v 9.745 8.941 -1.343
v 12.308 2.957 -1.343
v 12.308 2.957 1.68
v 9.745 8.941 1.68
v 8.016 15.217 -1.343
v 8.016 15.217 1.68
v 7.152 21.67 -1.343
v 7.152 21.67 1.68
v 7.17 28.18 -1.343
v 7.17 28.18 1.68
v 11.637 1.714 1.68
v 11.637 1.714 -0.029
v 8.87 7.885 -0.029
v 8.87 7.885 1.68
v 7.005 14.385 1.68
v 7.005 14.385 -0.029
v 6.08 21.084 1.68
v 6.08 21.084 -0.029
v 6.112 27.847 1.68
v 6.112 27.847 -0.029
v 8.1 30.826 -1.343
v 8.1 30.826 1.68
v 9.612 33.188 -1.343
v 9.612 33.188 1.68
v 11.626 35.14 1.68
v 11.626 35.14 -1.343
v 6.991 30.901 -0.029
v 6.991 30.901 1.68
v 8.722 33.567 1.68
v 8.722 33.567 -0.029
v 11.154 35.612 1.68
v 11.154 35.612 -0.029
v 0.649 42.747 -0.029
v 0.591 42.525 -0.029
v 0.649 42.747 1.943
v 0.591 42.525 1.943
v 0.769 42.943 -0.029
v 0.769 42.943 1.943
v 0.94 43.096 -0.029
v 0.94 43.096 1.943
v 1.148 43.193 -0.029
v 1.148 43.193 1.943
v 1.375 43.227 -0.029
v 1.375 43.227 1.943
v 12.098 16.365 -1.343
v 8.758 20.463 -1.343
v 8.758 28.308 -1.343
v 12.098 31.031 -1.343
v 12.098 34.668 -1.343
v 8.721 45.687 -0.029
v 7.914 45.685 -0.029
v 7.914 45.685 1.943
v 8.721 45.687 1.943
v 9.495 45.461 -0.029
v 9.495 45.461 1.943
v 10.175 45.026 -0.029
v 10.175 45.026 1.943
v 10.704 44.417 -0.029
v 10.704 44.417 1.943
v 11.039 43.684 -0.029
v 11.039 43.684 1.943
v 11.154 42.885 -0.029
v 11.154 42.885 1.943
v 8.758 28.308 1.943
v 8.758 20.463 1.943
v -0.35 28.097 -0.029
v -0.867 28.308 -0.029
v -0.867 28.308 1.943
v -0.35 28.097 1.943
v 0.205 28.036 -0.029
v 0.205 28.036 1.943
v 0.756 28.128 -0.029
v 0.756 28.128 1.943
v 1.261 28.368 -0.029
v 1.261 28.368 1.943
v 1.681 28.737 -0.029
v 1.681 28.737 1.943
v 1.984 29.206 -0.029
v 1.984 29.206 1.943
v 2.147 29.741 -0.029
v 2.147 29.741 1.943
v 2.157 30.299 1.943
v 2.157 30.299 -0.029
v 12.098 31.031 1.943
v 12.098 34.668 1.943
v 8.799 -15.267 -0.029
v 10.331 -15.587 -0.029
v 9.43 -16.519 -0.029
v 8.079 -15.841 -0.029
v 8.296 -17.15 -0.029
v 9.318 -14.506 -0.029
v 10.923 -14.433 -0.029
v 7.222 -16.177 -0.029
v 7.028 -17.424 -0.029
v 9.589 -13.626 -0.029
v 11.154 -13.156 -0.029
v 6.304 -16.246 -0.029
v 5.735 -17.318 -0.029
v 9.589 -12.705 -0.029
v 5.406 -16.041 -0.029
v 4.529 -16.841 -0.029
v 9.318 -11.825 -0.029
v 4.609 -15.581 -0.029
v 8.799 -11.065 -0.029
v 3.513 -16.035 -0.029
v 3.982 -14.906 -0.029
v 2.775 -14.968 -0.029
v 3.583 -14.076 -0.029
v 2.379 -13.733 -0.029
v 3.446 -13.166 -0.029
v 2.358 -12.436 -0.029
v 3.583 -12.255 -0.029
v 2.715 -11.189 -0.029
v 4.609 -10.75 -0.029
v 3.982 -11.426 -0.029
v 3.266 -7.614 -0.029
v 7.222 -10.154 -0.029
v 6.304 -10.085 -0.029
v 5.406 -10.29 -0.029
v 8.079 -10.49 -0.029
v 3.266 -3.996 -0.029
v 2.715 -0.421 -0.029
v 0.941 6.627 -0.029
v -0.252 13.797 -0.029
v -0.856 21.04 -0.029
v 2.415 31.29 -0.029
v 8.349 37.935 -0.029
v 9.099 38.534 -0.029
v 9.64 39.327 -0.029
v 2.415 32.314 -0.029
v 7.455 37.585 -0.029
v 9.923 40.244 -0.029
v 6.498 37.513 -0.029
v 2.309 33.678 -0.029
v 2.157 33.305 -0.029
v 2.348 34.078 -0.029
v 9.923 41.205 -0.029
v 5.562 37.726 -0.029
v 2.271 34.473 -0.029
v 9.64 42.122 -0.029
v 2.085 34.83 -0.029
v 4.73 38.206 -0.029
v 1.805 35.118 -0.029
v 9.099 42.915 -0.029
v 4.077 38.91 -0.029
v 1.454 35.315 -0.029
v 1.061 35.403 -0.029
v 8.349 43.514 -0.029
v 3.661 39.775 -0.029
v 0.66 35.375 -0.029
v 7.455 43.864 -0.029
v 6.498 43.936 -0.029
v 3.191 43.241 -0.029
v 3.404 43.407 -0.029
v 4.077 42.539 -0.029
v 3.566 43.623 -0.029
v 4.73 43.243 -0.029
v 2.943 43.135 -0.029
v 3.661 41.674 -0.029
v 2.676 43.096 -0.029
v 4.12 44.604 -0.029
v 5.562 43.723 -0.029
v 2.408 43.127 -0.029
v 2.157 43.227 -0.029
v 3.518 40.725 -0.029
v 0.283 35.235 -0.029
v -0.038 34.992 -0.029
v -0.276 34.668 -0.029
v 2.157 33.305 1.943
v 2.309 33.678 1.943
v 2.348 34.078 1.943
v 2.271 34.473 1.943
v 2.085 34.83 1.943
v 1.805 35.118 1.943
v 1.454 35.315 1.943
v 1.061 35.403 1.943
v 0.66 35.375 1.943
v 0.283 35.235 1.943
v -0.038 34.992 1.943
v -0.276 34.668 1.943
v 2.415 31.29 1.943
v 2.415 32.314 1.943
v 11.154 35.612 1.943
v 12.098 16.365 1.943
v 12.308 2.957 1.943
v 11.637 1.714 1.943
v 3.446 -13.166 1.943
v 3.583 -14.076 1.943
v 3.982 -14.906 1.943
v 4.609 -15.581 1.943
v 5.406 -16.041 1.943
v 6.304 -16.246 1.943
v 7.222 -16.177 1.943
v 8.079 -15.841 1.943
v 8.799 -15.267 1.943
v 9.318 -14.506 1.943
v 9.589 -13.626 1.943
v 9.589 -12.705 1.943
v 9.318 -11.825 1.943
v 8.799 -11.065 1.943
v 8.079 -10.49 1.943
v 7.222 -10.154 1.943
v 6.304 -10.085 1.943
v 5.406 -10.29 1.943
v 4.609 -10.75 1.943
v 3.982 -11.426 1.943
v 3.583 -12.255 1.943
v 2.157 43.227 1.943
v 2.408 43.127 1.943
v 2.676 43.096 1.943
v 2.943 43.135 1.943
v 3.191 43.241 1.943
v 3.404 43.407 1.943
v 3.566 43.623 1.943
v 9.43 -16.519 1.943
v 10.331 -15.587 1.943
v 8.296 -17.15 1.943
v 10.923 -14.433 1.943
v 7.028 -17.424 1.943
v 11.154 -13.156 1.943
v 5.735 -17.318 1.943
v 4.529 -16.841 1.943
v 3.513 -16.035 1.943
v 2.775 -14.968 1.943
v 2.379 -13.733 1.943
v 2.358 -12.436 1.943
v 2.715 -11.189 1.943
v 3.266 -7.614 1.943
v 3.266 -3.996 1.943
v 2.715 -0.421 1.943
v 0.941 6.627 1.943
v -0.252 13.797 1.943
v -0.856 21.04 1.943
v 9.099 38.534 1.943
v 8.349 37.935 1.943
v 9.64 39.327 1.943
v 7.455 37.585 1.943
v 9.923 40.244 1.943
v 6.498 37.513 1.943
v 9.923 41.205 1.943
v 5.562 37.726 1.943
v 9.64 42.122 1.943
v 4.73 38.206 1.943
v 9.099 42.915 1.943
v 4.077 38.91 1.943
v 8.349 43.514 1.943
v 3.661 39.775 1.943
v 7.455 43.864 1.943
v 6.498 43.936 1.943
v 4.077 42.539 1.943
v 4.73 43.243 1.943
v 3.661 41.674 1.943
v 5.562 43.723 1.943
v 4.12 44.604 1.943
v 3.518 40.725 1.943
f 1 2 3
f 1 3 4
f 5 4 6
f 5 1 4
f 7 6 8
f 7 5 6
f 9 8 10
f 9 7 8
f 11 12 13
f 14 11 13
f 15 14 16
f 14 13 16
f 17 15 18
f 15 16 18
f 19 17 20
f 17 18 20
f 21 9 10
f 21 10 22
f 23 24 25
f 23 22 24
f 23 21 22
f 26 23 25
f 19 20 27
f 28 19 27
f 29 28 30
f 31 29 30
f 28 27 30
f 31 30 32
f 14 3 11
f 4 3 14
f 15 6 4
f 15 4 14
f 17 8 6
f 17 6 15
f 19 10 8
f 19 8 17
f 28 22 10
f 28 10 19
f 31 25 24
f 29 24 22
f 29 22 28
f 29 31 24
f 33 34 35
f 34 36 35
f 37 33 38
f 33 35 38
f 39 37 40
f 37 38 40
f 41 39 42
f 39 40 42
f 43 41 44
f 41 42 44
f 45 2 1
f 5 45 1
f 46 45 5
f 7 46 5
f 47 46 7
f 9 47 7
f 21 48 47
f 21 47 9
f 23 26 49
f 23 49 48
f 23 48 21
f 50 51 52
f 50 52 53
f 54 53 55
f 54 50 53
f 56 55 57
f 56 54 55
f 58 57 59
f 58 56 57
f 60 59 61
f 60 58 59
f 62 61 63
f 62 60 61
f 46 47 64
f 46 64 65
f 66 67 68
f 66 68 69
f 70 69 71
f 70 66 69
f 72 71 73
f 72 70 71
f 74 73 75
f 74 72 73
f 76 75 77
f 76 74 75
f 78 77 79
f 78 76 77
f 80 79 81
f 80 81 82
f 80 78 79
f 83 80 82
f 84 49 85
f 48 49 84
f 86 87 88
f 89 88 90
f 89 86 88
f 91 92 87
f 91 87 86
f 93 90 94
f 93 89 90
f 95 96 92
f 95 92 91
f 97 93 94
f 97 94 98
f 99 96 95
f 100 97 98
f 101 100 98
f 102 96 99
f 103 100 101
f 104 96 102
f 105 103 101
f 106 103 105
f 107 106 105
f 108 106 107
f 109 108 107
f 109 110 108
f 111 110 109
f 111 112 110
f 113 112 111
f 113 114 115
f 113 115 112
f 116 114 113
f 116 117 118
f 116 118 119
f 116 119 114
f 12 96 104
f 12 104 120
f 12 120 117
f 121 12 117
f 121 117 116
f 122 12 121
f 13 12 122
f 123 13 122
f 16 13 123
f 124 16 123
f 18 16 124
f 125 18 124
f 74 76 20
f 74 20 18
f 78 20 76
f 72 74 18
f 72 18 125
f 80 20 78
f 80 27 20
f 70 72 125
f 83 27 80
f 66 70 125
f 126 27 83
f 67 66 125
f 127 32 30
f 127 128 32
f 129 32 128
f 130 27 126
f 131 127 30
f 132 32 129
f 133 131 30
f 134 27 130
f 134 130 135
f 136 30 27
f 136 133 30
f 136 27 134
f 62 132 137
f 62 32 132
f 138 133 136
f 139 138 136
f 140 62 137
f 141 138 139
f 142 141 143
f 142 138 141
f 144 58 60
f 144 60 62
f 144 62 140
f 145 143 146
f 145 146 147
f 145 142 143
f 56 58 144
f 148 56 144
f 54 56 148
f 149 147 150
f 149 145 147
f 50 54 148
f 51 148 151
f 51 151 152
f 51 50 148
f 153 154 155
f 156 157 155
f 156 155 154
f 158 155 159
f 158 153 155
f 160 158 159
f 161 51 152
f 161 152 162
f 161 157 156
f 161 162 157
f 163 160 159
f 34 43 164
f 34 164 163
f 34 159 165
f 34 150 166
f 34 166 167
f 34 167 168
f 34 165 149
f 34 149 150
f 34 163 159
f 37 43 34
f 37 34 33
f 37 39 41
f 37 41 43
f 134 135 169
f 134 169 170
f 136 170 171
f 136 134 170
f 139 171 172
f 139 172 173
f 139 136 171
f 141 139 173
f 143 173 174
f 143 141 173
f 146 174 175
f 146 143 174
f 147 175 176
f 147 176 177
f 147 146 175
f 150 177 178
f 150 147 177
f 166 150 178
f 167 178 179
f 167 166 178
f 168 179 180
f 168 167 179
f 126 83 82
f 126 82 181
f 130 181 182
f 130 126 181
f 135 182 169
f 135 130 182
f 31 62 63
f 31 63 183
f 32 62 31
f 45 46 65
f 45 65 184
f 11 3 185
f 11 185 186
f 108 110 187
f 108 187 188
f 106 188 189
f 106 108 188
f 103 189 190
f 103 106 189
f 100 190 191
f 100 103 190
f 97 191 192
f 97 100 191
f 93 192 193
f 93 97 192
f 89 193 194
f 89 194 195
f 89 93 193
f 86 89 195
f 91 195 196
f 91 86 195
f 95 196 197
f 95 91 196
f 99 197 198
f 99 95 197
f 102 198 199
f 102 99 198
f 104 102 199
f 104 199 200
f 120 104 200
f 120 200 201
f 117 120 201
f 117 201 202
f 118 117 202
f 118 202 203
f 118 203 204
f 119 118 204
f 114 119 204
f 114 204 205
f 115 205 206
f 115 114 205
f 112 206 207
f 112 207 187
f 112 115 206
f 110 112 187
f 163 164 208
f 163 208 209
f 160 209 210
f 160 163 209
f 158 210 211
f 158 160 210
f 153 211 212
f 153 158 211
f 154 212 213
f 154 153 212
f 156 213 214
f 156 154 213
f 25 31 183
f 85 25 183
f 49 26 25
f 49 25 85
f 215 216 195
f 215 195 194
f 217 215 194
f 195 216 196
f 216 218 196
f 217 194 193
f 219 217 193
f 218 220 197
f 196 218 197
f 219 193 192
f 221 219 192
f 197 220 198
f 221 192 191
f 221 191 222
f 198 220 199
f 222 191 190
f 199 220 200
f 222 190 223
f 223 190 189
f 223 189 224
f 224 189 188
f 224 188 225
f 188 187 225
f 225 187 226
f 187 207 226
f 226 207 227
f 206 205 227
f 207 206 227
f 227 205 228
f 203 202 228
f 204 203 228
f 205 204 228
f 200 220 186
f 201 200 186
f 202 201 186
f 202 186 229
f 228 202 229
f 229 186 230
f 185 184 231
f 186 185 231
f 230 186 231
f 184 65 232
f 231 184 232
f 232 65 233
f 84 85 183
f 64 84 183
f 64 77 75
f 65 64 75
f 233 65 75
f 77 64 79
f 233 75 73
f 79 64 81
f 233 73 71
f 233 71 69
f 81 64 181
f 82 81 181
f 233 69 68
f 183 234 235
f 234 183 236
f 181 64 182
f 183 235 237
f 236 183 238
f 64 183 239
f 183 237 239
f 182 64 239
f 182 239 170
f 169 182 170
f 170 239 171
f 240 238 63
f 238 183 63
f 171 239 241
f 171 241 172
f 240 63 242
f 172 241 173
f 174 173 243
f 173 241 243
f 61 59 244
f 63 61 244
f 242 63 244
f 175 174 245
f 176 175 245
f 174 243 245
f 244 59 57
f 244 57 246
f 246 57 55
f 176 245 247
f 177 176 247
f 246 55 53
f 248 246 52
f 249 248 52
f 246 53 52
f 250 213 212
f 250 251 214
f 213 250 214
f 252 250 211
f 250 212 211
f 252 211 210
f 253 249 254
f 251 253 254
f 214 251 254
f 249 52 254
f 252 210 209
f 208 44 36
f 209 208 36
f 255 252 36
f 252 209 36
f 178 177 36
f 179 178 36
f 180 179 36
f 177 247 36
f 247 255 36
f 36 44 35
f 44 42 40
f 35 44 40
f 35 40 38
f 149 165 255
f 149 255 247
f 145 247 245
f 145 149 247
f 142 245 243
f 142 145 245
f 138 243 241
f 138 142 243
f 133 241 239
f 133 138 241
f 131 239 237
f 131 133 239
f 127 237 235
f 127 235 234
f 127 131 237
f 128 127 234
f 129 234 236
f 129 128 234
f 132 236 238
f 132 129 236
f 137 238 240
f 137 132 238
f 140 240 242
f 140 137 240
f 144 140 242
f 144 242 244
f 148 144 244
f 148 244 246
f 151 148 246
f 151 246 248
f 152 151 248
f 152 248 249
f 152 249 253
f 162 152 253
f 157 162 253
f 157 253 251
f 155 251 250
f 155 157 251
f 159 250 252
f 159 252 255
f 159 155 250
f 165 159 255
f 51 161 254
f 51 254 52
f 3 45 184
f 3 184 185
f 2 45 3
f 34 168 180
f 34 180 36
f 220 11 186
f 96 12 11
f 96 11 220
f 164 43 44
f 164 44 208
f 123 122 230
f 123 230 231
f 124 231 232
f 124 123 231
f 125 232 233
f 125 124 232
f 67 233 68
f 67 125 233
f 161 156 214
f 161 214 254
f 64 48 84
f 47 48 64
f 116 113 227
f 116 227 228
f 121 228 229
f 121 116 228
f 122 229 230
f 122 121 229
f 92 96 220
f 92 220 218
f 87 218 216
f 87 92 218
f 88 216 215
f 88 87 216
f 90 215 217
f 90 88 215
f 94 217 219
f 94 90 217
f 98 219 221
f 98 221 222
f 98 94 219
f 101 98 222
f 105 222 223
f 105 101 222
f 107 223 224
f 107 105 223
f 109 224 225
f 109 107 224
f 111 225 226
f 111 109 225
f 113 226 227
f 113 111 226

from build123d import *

# Parameters (mm, degrees)
SKETCH1_R           = 3.1115
SKETCH1_R_2         = 2.9845
BOSS_EXTRUDE1_DEPTH = 1.905
CUT_EXTRUDE1_DEPTH  = 1.651
BOSS_EXTRUDE2_START = 1.27
BOSS_EXTRUDE2_DEPTH = 1.27
FILLET1_R           = 0.762
SCALE1_SCALE        = 1.0350841


with BuildPart() as part:
    # Sketch1 → Boss-Extrude1 (new body)
    with BuildSketch(Plane.XY):
        with BuildLine():
            Line((11.455137598, 2.171678291), (10.988691825, -12.194362723))
            ThreePointArc((10.988691825, -12.194362723), (5.753403312, -16.215064409), (2.835732355, -10.293790556))
            ThreePointArc((2.835732355, -10.293790556), (3.433990562, -5.092237988), (2.835732355, 0.109314579))
            ThreePointArc((2.835732355, 0.109314579), (-0.031028462, 13.845472924), (-0.62536344, 27.864999648))
            ThreePointArc((-0.62536344, 27.864999648), (1.430712022, 27.922734075), (2.296539191, 29.788510826))
            ThreePointArc((2.296539191, 29.788510826), (2.577489408, 31.240527695), (2.296539191, 32.692544565))
            ThreePointArc((2.296539191, 32.692544565), (1.793167017, 34.551137871), (-0.054485013, 34.008980516))
            Line((-0.054485013, 34.008980516), (0.8585336, 42.2777508))
            Line((0.8585336, 42.2777508), (2.296539191, 42.2777508))
            ThreePointArc((2.296539191, 42.2777508), (3.056005554, 42.188646363), (3.657600202, 42.660676697))
            Line((3.657600202, 42.660676697), (4.193229273, 43.60832813))
            Line((4.193229273, 43.60832813), (7.858351578, 44.652580854))
            ThreePointArc((7.858351578, 44.652580854), (10.042305559, 44.016121117), (10.988691825, 41.94752521))
            Line((10.988691825, 41.94752521), (10.988691825, 34.921067581))
            Line((10.988691825, 34.921067581), (11.90077889, 34.008980516))
            Line((11.90077889, 34.008980516), (11.90077889, 30.495455397))
            Line((11.90077889, 30.495455397), (8.673783219, 27.864999648))
            Line((8.673783219, 27.864999648), (8.673783219, 20.285030353))
            Line((8.673783219, 20.285030353), (11.90077889, 16.326210266))
            Line((11.90077889, 16.326210266), (12.102967643, 3.372738413))
            Line((12.102967643, 3.372738413), (11.455137598, 2.171678291))
        make_face()
        with Locations(Location((6.72245078, 39.860230894, 0), (0, 0, 180))):
            Circle(SKETCH1_R, mode=Mode.SUBTRACT)
        with Locations(Location((6.525698673, -12.20338788, 0), (0, 0, 180))):
            Circle(SKETCH1_R_2, mode=Mode.SUBTRACT)
    extrude(amount=BOSS_EXTRUDE1_DEPTH)

    # Sketch7 → Cut-Extrude1 (cut)
    with BuildSketch(Plane(origin=(0, 0, 0), x_dir=(-1, 0, 0), z_dir=(0, 0, -1))):
        with BuildLine():
            Line((-12.102967643, 3.372738413), (-11.455137598, 2.171678291))
            ThreePointArc((-11.455137598, 2.171678291), (-6.980280612, 14.413742368), (-6.117233468, 27.41941911))
            ThreePointArc((-6.117233468, 27.41941911), (-7.707175586, 31.719484817), (-10.988691825, 34.921067581))
            Line((-10.988691825, 34.921067581), (-11.444735357, 34.465024049))
            ThreePointArc((-11.444735357, 34.465024049), (-8.702145747, 31.480644967), (-7.139396786, 27.740841235))
            ThreePointArc((-7.139396786, 27.740841235), (-7.956577994, 15.217724405), (-12.102967643, 3.372738413))
        make_face()
    extrude(amount=-CUT_EXTRUDE1_DEPTH, mode=Mode.SUBTRACT)

    # Sketch8 → Boss-Extrude2 (add)
    with BuildSketch(Plane(origin=(0, 0, 0), x_dir=(-1, 0, 0), z_dir=(0, 0, -1)).offset(BOSS_EXTRUDE2_START)):
        with BuildLine():
            Line((-11.90077889, 16.326210266), (-12.102967643, 3.372738413))
            ThreePointArc((-12.102967643, 3.372738413), (-7.956577994, 15.217724405), (-7.139396786, 27.740841235))
            ThreePointArc((-7.139396786, 27.740841235), (-8.702145747, 31.480644967), (-11.444735357, 34.465024049))
            Line((-11.444735357, 34.465024049), (-11.90077889, 34.008980516))
            Line((-11.90077889, 34.008980516), (-11.90077889, 30.495455397))
            Line((-11.90077889, 30.495455397), (-8.673783219, 27.864999648))
            Line((-8.673783219, 27.864999648), (-8.673783219, 20.285030353))
            Line((-8.673783219, 20.285030353), (-11.90077889, 16.326210266))
        make_face()
    extrude(amount=-BOSS_EXTRUDE2_DEPTH)

    # Fillet1
    fillet1_edges = [part.edges().sort_by_distance(p)[0] for p in [
        (0.8585336, 42.2777508, 0.9525),
    ]]
    fillet(fillet1_edges, radius=FILLET1_R)


with BuildPart() as part_1:
    # Scale1: scaled about (6.266812803, 15.225745721, 0.817427893)
    add(part.part.scale(SCALE1_SCALE).moved(Location((-0.219865487, -0.534181585, -0.028678722))))


solid = part_1.part
